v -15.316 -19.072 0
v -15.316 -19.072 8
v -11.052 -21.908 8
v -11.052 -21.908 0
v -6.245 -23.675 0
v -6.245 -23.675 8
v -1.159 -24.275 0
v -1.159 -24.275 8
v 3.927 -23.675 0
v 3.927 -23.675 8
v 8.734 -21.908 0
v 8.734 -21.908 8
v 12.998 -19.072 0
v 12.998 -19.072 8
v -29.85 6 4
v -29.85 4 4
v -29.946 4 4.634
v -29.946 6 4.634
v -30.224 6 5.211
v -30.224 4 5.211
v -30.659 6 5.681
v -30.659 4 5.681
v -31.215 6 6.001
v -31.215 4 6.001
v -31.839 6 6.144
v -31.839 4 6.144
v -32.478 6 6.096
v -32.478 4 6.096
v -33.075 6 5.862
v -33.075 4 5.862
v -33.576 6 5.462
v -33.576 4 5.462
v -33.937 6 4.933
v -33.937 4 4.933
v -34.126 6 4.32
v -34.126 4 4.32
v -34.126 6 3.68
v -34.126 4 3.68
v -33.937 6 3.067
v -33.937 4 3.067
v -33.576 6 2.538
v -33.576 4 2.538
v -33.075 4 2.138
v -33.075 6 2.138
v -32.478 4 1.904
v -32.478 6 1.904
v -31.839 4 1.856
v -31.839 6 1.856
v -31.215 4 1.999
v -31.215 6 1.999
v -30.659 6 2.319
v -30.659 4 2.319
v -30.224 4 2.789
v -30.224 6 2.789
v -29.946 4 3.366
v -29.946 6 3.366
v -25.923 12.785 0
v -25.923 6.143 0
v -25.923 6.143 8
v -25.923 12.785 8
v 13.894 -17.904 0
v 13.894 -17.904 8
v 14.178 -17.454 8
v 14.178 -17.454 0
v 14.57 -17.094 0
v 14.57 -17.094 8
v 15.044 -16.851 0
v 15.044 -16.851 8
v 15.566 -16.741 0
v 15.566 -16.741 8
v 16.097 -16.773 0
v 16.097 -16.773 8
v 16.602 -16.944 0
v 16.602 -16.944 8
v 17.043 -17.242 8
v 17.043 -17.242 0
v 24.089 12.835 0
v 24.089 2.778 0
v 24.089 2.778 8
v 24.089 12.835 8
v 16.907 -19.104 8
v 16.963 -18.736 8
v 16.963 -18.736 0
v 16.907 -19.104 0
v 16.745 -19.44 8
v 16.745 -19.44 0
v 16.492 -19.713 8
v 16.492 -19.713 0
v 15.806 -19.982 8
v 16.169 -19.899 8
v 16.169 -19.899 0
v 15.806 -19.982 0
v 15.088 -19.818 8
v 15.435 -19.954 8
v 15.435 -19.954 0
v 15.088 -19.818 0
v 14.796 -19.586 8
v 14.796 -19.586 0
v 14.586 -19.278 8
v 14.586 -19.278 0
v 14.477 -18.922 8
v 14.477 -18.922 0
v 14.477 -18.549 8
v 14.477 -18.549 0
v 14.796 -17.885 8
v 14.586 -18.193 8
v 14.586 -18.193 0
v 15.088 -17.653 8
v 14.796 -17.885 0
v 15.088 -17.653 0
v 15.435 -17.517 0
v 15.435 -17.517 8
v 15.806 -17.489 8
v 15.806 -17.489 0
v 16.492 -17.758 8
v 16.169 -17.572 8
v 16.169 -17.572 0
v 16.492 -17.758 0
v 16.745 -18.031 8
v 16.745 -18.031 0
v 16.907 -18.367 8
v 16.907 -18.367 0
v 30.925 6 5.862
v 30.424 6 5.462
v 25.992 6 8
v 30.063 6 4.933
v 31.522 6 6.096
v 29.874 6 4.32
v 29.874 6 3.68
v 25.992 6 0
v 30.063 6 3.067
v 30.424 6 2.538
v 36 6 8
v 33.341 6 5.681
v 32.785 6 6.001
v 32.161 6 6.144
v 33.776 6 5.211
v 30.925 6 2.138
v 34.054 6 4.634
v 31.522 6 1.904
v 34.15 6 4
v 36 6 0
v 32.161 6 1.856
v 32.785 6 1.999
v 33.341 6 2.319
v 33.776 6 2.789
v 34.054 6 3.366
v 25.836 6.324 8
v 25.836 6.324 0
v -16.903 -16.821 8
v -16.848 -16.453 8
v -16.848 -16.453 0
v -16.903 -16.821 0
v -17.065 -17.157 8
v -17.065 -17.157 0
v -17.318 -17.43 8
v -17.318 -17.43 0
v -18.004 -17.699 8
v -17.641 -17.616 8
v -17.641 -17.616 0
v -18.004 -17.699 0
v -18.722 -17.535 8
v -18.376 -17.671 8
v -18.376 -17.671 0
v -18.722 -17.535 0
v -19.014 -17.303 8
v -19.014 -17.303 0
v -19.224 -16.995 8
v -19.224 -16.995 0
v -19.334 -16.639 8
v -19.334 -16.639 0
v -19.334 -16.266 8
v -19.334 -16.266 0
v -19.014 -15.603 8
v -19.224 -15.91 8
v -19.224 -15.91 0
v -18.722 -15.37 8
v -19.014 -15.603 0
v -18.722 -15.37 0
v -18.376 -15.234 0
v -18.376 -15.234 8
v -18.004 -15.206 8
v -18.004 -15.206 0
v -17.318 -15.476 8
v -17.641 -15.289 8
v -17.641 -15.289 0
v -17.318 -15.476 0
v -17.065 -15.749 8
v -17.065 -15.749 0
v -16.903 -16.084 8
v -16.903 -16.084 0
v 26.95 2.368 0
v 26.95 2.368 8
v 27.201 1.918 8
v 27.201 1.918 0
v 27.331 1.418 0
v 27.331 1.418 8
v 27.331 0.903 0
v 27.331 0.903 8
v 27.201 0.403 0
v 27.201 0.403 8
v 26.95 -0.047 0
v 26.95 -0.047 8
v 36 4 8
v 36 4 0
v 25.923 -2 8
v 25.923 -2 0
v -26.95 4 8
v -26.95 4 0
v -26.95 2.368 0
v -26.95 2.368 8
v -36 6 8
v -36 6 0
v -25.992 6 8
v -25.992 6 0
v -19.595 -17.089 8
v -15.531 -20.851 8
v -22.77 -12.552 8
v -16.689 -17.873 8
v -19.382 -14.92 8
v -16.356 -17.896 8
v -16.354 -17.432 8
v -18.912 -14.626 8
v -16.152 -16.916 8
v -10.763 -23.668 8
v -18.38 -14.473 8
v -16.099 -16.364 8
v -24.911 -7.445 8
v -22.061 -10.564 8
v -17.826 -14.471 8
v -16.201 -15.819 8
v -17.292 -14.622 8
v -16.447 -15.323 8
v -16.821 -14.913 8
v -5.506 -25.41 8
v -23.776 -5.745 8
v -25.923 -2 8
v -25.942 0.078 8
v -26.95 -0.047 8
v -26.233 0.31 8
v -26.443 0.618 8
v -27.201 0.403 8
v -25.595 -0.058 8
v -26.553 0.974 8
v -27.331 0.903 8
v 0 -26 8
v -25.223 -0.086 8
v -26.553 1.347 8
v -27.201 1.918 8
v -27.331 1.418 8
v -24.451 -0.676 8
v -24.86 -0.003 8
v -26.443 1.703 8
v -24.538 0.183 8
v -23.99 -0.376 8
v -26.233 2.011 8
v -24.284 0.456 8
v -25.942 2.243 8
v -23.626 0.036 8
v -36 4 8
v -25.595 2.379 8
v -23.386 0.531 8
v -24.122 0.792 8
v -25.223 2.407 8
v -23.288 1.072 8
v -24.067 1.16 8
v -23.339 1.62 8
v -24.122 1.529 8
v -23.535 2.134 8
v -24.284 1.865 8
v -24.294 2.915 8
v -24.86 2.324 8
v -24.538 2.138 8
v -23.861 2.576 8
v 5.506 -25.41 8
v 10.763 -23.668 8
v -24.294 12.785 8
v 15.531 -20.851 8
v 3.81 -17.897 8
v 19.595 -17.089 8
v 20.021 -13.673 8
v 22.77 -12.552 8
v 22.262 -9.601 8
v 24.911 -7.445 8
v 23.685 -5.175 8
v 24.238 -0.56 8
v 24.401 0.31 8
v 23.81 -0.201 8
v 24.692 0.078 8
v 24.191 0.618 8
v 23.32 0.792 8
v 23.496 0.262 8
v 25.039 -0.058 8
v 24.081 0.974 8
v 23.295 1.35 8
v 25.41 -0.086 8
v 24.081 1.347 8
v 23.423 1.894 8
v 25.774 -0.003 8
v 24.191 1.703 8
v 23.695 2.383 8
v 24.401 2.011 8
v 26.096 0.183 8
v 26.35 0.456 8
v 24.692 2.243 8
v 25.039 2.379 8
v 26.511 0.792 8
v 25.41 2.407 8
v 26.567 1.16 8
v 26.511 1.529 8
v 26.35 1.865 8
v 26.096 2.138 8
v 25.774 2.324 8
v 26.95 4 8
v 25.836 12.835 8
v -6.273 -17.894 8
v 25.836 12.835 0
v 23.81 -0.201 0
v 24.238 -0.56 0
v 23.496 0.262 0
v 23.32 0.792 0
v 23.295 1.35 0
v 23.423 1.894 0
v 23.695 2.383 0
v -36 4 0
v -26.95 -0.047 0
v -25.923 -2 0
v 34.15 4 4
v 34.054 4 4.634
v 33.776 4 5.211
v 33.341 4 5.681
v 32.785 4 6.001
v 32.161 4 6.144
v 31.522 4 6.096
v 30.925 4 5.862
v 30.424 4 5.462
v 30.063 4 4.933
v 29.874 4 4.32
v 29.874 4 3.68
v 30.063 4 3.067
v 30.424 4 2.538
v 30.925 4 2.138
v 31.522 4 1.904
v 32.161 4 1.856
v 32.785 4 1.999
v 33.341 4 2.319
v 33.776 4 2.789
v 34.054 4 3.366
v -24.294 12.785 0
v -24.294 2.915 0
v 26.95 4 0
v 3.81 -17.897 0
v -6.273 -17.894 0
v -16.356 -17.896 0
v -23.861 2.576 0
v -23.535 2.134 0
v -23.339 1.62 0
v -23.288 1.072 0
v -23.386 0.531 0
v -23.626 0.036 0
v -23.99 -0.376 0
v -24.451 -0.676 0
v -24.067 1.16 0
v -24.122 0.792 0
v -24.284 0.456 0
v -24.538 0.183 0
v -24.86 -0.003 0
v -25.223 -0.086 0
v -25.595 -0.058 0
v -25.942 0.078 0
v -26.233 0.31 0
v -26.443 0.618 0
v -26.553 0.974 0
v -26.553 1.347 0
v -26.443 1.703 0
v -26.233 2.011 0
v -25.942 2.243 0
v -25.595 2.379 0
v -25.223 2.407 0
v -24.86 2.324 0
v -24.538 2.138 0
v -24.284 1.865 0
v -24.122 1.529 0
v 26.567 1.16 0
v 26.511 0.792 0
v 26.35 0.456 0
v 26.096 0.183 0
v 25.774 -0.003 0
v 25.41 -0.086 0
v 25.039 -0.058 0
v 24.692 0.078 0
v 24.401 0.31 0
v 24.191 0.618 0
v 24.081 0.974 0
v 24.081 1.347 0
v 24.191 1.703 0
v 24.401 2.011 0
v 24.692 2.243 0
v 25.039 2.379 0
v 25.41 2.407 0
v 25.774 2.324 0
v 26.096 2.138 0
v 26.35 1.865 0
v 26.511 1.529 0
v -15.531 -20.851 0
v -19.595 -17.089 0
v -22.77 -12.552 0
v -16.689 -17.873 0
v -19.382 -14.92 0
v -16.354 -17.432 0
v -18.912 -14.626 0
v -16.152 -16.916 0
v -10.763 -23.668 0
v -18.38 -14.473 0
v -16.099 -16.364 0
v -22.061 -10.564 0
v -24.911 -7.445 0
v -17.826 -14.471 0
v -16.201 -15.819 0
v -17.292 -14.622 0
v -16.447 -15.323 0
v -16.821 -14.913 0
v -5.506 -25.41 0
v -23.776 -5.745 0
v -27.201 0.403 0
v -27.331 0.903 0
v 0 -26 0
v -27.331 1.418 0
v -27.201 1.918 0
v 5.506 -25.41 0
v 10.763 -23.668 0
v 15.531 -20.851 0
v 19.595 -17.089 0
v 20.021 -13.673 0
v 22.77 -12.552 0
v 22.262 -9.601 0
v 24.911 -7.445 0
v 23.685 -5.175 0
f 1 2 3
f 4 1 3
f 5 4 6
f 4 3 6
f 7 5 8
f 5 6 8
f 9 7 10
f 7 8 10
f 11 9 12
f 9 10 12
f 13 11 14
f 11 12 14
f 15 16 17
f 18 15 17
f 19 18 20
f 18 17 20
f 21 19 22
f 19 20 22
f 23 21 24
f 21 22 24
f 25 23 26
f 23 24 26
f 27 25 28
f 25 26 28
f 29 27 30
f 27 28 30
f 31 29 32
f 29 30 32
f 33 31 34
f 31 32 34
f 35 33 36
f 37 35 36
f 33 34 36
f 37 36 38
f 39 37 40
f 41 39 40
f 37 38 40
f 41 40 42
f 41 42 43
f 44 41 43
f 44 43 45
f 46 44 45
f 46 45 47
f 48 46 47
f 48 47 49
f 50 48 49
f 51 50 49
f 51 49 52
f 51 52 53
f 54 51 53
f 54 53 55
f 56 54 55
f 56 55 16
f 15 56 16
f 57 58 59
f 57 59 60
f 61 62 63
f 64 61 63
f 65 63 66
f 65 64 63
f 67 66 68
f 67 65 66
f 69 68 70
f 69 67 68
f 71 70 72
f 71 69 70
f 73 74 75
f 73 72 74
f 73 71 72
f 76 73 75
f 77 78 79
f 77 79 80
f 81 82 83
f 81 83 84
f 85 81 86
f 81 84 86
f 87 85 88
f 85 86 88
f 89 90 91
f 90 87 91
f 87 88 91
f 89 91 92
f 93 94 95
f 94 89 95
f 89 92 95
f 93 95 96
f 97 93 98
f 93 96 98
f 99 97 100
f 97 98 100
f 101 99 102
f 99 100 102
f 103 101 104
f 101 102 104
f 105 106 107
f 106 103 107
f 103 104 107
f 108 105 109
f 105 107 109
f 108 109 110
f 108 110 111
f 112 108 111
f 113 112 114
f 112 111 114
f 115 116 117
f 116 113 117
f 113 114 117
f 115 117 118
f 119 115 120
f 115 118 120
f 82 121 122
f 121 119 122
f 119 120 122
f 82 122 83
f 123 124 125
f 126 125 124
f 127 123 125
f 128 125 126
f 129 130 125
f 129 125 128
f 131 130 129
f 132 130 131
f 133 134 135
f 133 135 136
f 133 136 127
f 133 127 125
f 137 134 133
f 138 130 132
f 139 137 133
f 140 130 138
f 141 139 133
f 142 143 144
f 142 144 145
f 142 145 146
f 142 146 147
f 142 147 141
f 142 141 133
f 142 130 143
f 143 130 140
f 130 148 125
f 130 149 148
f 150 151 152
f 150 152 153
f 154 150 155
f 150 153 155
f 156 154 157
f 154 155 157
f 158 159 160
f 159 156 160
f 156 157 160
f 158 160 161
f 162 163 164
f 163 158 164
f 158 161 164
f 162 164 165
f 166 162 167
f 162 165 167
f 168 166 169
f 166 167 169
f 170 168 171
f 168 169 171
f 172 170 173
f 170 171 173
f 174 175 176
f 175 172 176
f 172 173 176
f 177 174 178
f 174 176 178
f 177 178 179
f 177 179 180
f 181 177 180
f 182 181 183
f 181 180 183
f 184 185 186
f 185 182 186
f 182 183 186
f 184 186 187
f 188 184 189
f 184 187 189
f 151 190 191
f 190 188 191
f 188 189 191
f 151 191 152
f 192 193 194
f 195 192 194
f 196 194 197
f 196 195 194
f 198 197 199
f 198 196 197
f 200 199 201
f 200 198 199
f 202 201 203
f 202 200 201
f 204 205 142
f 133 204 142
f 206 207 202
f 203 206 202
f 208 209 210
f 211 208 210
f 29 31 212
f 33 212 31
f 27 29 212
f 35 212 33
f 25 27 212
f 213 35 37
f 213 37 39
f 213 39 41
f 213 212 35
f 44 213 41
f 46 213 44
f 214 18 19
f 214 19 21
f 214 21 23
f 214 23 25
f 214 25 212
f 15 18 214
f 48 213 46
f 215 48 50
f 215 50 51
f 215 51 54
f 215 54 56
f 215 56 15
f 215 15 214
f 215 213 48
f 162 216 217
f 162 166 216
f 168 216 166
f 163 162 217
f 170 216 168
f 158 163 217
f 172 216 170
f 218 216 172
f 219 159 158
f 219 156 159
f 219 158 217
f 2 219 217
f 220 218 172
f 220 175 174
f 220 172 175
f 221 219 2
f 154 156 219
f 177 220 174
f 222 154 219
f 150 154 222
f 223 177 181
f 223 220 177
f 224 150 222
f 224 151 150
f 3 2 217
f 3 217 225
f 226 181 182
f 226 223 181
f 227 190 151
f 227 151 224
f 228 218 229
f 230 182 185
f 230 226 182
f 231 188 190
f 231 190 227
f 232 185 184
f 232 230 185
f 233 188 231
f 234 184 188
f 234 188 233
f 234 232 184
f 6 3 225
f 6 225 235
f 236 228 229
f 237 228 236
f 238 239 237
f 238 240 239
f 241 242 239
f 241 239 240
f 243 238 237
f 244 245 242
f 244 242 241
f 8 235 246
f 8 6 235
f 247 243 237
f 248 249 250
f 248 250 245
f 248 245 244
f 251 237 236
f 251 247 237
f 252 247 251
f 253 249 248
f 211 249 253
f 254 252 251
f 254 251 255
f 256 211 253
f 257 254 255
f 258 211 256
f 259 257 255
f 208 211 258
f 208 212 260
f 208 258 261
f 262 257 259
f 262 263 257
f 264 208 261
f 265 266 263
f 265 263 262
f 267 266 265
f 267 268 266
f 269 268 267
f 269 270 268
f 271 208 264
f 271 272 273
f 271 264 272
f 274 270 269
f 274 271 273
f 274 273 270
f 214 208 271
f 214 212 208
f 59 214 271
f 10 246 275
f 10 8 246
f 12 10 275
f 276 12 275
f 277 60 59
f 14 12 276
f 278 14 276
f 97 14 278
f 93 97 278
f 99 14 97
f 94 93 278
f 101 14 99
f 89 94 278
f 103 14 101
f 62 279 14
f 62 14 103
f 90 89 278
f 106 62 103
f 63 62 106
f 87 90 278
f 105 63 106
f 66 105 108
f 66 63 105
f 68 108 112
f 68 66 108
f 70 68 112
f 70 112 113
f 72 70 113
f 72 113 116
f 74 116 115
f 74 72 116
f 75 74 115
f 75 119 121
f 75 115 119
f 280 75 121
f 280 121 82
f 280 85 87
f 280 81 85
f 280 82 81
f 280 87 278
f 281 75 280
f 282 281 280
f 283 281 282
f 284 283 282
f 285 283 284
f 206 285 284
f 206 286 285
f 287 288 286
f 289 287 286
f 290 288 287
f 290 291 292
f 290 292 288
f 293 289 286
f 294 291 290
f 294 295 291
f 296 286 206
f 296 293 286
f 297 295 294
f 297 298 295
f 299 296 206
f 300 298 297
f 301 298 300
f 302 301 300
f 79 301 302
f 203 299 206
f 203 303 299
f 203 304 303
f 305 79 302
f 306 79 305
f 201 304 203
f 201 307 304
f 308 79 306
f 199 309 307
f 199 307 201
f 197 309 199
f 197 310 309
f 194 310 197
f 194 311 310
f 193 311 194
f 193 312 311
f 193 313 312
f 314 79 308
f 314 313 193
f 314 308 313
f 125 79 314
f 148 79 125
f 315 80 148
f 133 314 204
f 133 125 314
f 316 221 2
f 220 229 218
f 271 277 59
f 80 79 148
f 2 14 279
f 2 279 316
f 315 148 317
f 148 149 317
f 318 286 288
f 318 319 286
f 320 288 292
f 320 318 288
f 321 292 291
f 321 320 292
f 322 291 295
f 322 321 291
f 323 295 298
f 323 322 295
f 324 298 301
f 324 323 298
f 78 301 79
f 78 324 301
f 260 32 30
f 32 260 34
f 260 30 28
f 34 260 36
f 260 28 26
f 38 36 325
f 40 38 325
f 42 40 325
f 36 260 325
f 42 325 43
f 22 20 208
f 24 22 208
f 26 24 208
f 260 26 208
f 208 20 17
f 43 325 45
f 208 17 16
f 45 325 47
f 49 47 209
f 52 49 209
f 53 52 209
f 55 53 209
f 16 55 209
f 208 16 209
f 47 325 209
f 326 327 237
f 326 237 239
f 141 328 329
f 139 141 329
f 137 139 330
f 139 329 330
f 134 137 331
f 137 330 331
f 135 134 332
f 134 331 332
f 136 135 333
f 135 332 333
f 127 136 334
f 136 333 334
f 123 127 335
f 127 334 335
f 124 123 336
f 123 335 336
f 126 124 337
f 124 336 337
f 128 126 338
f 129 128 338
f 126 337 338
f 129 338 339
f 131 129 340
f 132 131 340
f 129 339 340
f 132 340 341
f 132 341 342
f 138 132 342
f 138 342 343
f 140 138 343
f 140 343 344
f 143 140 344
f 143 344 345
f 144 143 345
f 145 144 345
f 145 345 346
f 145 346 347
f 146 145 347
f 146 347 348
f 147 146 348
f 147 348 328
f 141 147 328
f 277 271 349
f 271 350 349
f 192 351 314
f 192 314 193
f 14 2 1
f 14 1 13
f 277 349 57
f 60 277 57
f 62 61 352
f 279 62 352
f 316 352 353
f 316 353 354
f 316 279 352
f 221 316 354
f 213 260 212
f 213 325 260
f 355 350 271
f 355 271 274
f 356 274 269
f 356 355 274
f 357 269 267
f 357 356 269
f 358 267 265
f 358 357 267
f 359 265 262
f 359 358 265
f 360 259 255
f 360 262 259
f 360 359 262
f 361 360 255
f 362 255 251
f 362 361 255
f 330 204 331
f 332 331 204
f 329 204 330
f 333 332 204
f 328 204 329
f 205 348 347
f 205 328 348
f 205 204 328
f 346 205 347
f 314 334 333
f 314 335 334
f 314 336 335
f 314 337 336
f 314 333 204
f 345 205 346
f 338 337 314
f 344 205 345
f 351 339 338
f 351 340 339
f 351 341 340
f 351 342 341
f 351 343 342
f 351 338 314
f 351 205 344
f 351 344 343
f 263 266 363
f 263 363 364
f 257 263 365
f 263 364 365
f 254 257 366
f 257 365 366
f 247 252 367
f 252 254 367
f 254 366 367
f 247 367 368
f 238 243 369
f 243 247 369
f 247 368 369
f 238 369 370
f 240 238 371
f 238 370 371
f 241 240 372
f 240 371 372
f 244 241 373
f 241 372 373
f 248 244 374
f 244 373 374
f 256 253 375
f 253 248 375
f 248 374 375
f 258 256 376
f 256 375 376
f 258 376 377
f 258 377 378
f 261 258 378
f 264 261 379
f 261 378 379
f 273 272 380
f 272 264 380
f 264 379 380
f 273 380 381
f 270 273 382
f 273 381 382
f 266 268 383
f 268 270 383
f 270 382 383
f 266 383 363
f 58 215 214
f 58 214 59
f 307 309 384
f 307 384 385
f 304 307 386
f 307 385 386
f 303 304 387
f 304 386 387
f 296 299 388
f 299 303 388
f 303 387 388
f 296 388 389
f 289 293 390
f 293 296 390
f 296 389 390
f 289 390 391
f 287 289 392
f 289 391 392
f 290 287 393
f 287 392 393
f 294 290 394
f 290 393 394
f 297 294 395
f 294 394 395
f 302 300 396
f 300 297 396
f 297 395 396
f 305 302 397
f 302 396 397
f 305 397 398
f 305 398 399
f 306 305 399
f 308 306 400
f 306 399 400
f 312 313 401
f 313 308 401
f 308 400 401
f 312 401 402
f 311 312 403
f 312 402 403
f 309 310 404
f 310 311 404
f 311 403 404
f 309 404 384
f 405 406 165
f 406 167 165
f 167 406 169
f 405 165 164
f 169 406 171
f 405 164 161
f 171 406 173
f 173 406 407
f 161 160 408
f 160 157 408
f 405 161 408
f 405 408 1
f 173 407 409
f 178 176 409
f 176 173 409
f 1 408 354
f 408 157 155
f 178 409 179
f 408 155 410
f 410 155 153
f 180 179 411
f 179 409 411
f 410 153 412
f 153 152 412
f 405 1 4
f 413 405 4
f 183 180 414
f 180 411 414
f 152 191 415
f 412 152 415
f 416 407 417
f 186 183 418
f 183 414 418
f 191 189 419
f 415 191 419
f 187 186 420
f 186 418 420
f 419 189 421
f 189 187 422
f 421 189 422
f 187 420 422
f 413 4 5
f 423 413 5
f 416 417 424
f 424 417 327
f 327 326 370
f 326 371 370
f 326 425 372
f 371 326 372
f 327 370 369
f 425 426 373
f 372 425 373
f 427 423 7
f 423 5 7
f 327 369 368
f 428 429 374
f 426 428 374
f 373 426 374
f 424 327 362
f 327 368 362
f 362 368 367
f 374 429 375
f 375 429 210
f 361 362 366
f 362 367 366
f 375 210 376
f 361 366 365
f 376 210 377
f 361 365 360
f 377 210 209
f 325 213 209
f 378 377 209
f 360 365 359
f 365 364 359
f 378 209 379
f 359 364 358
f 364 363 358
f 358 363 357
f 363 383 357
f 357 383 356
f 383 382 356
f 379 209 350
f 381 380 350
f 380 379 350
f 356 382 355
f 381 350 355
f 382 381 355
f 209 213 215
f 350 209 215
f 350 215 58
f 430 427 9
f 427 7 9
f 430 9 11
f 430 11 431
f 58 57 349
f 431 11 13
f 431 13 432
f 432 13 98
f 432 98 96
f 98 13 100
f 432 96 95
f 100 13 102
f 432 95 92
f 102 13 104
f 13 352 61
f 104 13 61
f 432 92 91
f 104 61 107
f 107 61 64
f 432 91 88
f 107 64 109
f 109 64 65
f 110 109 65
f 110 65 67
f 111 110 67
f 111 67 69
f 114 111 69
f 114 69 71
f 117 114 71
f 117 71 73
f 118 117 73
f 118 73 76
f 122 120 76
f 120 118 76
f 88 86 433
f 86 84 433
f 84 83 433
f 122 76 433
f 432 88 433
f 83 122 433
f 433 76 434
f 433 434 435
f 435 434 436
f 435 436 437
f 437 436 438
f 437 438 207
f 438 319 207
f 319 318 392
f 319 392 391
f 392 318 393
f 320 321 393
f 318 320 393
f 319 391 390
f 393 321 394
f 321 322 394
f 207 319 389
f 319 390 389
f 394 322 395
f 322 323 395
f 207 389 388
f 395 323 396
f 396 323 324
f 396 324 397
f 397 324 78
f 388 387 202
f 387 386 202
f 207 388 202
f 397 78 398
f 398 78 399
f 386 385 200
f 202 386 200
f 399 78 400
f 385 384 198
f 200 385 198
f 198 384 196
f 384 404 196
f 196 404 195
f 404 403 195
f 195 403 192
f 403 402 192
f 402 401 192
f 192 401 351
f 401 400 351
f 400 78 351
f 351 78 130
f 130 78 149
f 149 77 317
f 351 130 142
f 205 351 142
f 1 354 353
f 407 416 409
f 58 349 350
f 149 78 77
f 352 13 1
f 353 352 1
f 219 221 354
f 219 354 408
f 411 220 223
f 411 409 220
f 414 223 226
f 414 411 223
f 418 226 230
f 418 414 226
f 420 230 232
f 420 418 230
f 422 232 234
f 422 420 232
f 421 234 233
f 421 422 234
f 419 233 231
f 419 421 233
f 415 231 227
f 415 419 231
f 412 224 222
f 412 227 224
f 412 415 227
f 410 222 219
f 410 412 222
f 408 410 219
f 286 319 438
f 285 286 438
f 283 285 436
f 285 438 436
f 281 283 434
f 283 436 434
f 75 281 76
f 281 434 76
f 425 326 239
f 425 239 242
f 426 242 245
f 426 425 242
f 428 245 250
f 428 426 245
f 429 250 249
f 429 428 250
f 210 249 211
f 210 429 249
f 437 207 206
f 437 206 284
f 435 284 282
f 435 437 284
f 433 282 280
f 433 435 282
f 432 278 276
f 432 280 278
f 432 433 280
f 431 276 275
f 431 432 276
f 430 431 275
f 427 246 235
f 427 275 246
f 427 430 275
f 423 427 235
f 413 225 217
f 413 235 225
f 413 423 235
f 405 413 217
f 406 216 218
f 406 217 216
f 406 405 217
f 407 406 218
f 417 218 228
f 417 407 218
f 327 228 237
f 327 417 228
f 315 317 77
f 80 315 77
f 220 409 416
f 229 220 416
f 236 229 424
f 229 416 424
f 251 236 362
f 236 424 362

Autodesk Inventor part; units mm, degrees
ref_plane "YZ Plane" through (0, 0, 0) normal (1, 0, 0) x (0, 1, 0)
ref_plane "XZ Plane" through (0, 0, 0) normal (0, 1, 0) x (-1, 0, 0)
ref_plane "XY Plane" through (0, 0, 0) normal (0, 0, 1) x (1, 0, 0)
sketch "Esquisse1" plane through (0, 0, 0) normal (0, 0, 1) x (1, 0, 0)
  line L0 (0, 0) -> (-27.546, -25.0426) construction
  line L1 (0, 0) -> (23.0277, -27.4577) construction
  circle A0 centre (-18.0975, -16.4528) radius 1.25
  circle A1 centre (15.7127, -18.7355) radius 1.25
  arc A2 (-16.6894, -17.8731) -> (14.1299, -19.9581) centre (0, 0) ccw
  arc A3 (-16.6894, -17.8731) -> (-19.3824, -14.9201) centre (-18.0975, -16.4528) ccw
  arc A4 (17.0433, -17.2424) -> (14.1299, -19.9581) centre (15.7127, -18.7355) ccw
  line L2 (0, 0) -> (-29.5508, 10.7556) construction
  line L3 (-17.8311, 0) -> (17.1748, 0) construction
  line L4 (0, 2.0526) -> (0, -2.2236) construction
  arc A5 (-25.923, -2) -> (25.923, -2) centre (0, 0) ccw
  circle A6 centre (0, 0) radius 22.5 construction
  arc A7 (-16.6894, -17.8731) -> (14.1299, -19.9581) centre (0, 0) ccw
  arc A8 (-16.6894, -17.8731) -> (14.1299, -19.9581) centre (0, 0) ccw
  circle A9 centre (-25.3169, 1.1605) radius 1.25
  circle A10 centre (25.3169, 1.1605) radius 1.25
  line L5 (24.0891, 2.7784) -> (24.0891, 12.8348)
  line L6 (25.8363, 12.8348) -> (24.0891, 12.8348)
  line L7 (-25.923, 6.143) -> (-25.923, 12.7847)
  line L8 (-24.2942, 2.9148) -> (-24.2942, 12.7847)
  line L9 (-24.2942, 12.7847) -> (-25.923, 12.7847)
  arc A11 (-24.4506, -0.676) -> (-19.3824, -14.9201) centre (0, 0) ccw
  arc A12 (-24.4506, -0.676) -> (-19.3824, -14.9201) centre (0, 0) ccw
  arc A13 (-24.4506, -0.676) -> (-24.2942, 2.9148) centre (-25.3169, 1.1605) ccw
  arc A14 (17.0433, -17.2424) -> (24.2376, -0.5599) centre (0, 0) ccw
  arc A15 (17.0433, -17.2424) -> (24.2376, -0.5599) centre (0, 0) ccw
  arc A16 (17.0433, -17.2424) -> (24.2376, -0.5599) centre (0, 0) ccw
  arc A17 (24.0891, 2.7784) -> (24.2376, -0.5599) centre (25.3169, 1.1605) ccw
  line L10 (25.8363, 3.0919) -> (25.8363, 3.124)
  line L11 (25.8363, 6.3239) -> (25.8363, 12.8348)
  line L12 (25.8363, 6.3239) -> (25.9915, 6)
  line L13 (-36, 4) -> (-26.9495, 4)
  line L14 (-36, 6) -> (-26, 6)
  line L15 (-36, 4) -> (-36, 6)
  line L16 (-26, 6) -> (-25.9915, 6)
  line L17 (-25.9915, 6) -> (-25.923, 6.143)
  line L18 (-26.9495, 4) -> (-26.9495, 2.3678)
  line L19 (-25.923, -2) -> (-26.9495, -0.0468)
  arc A18 (-26.9495, 2.3678) -> (-26.9495, -0.0468) centre (-25.3169, 1.1605) ccw
  arc A19 (-24.4506, -0.676) -> (-24.2942, 2.9148) centre (-25.3169, 1.1605) ccw
  line L20 (25.9915, 6) -> (25.923, 6.143)
  line L21 (36, 4) -> (26.9495, 4)
  line L22 (36, 6) -> (26, 6)
  line L23 (36, 4) -> (36, 6)
  line L24 (26.9495, 4) -> (26.9495, 2.3678)
  line L25 (25.923, -2) -> (26.9495, -0.0468)
  arc A20 (26.9495, -0.0468) -> (26.9495, 2.3678) centre (25.3169, 1.1605) ccw
  line L26 (25.9915, 6) -> (26, 6)
  point P0 (29.8237, -2)
  point P1 (-36, -2)
  point P2 (-26.3114, 9.5766)
  dimension "d35" = 2.5
  dimension "d36" = 2.5
  dimension "d37" = 4
  dimension "d38" = 4
  dimension "d39" = 20
  dimension "d52" = 45
  dimension "d65" = 2.5
  dimension "d81" = 10
ref_plane "Plan de construction1" through (-42, 0, 0) normal (0, 1, 0) x (1, 0, 0)
ref_plane "Plan de construction2" through (-36, 0, 0) normal (0, 1, 0) x (1, 0, 0)
sketch "Esquisse3" plane through (-36, 0, 0) normal (0, 1, 0) x (1, 0, 0)
  line L0 (0, 0) -> (10, 0) projected
  line L1 (0, 0) -> (0, -8) projected
  line L2 (10, -8) -> (0, -8) projected
  line L3 (10, 0) -> (10, -8) projected
  circle A0 centre (4, -4) radius 2.15
  line L4 (62, 0) -> (72, 0) projected
  line L5 (62, 0) -> (62, -8) projected
  line L6 (72, -8) -> (62, -8) projected
  line L7 (72, 0) -> (72, -8) projected
  circle A1 centre (68, -4) radius 2.15
  point P0 (36, 0)
  dimension "d48" = 4.3
  dimension "d73" = 4
  dimension "d74" = 4.3
  dimension "d75" = 4
extrude "Extrusion16" add sketch "Esquisse1" along normal blind 8
extrude "Extrusion17" cut sketch "Esquisse3" along normal blind 8 contours A0 | A1
sketch "Esquisse5" plane through (0, 0, 8) normal (0, 0, 1) x (1, 0, 0)
  arc A0 (-16.6894, -17.8731) -> (14.1299, -19.9581) centre (0, 0) ccw projected
  circle A1 centre (25.3169, 1.1605) radius 1.25 projected
  circle A2 centre (-25.3169, 1.1605) radius 1.25 projected
  circle A3 centre (15.7127, -18.7355) radius 1.25 projected
  circle A4 centre (-18.0975, -16.4528) radius 1.25 projected
  arc A5 (-16.6894, -17.8731) -> (-19.3824, -14.9201) centre (-18.0975, -16.4528) ccw projected
  arc A6 (-24.4506, -0.676) -> (-19.3824, -14.9201) centre (0, 0) ccw projected
  arc A7 (-24.4506, -0.676) -> (-24.2942, 2.9148) centre (-25.3169, 1.1605) ccw projected
  line L0 (-24.2942, 2.9148) -> (-24.2942, 12.7847) projected
  line L1 (-24.2942, 12.7847) -> (-25.923, 12.7847) projected
  line L2 (-25.923, 12.7847) -> (-25.923, 6.143) projected
  line L3 (-25.923, 6.143) -> (-25.9915, 6) projected
  line L4 (-25.9915, 6) -> (-36, 6) projected
  line L5 (-36, 6) -> (-36, 4) projected
  line L6 (-36, 4) -> (-26.9495, 4) projected
  line L7 (-26.9495, 4) -> (-26.9495, 2.3678) projected
  arc A8 (-26.9495, 2.3678) -> (-26.9495, -0.0468) centre (-25.3169, 1.1605) ccw projected
  line L8 (-26.9495, -0.0468) -> (-25.923, -2) projected
  arc A9 (-25.923, -2) -> (25.923, -2) centre (0, 0) ccw projected
  line L9 (25.923, -2) -> (26.9495, -0.0468) projected
  arc A10 (26.9495, -0.0468) -> (26.9495, 2.3678) centre (25.3169, 1.1605) ccw projected
  line L10 (26.9495, 2.3678) -> (26.9495, 4) projected
  line L11 (26.9495, 4) -> (36, 4) projected
  line L12 (36, 4) -> (36, 6) projected
  line L13 (36, 6) -> (25.9915, 6) projected
  line L14 (25.9915, 6) -> (25.8363, 6.3239) projected
  line L15 (25.8363, 6.3239) -> (25.8363, 12.8348) projected
  line L16 (25.8363, 12.8348) -> (24.0891, 12.8348) projected
  line L17 (24.0891, 12.8348) -> (24.0891, 2.7784) projected
  arc A11 (24.0891, 2.7784) -> (24.2376, -0.5599) centre (25.3169, 1.1605) ccw projected
  arc A12 (17.0433, -17.2424) -> (24.2376, -0.5599) centre (0, 0) ccw projected
  arc A13 (17.0433, -17.2424) -> (14.1299, -19.9581) centre (15.7127, -18.7355) ccw projected
  arc A14 (-16.6894, -17.8731) -> (14.1299, -19.9581) centre (0, 0) ccw projected
  line L18 (-16.356, -17.8956) -> (-16.6894, -17.8731)
  arc A15 (17.0433, -17.2424) -> (14.1299, -19.9581) centre (15.7127, -18.7355) ccw projected
  arc A16 (13.8936, -17.9043) -> (-16.356, -17.8956) centre (-8.178, -24366.3326) ccw
  arc A17 (-16.6894, -17.8731) -> (-19.3824, -14.9201) centre (-18.0975, -16.4528) ccw projected
  arc A18 (-16.6894, -17.8731) -> (14.1299, -19.9581) centre (0, 0) ccw
  arc A19 (13.8936, -17.9043) -> (14.1299, -19.9581) centre (15.7127, -18.7355) ccw
extrude "Extrusion18" add sketch "Esquisse5" against normal blind 8 contours L18 A16 A13 A0
sketch "Esquisse6" plane through (0, 0, 8) normal (0, 0, 1) x (1, 0, 0)
  circle A0 centre (25.3169, 1.1605) radius 1.25 projected
  circle A1 centre (-25.3169, 1.1605) radius 1.25 projected
  circle A2 centre (15.7127, -18.7355) radius 1.25 projected
  circle A3 centre (-18.0975, -16.4528) radius 1.25 projected
  arc A4 (-16.6894, -17.8731) -> (-19.3824, -14.9201) centre (-18.0975, -16.4528) ccw projected
  arc A5 (-24.4506, -0.676) -> (-19.3824, -14.9201) centre (0, 0) ccw projected
  arc A6 (-24.4506, -0.676) -> (-24.2942, 2.9148) centre (-25.3169, 1.1605) ccw projected
  line L0 (-24.2942, 2.9148) -> (-24.2942, 12.7847) projected
  line L1 (-24.2942, 12.7847) -> (-25.923, 12.7847) projected
  line L2 (-25.923, 12.7847) -> (-25.923, 6.143) projected
  line L3 (-25.923, 6.143) -> (-25.9915, 6) projected
  line L4 (-25.9915, 6) -> (-36, 6) projected
  line L5 (-36, 6) -> (-36, 4) projected
  line L6 (-36, 4) -> (-26.9495, 4) projected
  line L7 (-26.9495, 4) -> (-26.9495, 2.3678) projected
  arc A7 (-26.9495, 2.3678) -> (-26.9495, -0.0468) centre (-25.3169, 1.1605) ccw projected
  line L8 (-26.9495, -0.0468) -> (-25.923, -2) projected
  arc A8 (-25.923, -2) -> (25.923, -2) centre (0, 0) ccw projected
  line L9 (25.923, -2) -> (26.9495, -0.0468) projected
  arc A9 (26.9495, -0.0468) -> (26.9495, 2.3678) centre (25.3169, 1.1605) ccw projected
  line L10 (26.9495, 2.3678) -> (26.9495, 4) projected
  line L11 (26.9495, 4) -> (36, 4) projected
  line L12 (36, 4) -> (36, 6) projected
  line L13 (36, 6) -> (25.9915, 6) projected
  line L14 (25.9915, 6) -> (25.8363, 6.3239) projected
  line L15 (25.8363, 6.3239) -> (25.8363, 12.8348) projected
  line L16 (25.8363, 12.8348) -> (24.0891, 12.8348) projected
  line L17 (24.0891, 12.8348) -> (24.0891, 2.7784) projected
  arc A10 (24.0891, 2.7784) -> (24.2376, -0.5599) centre (25.3169, 1.1605) ccw projected
  arc A11 (17.0433, -17.2424) -> (24.2376, -0.5599) centre (0, 0) ccw projected
  arc A12 (17.0433, -17.2424) -> (13.8936, -17.9043) centre (15.7127, -18.7355) ccw projected
  arc A13 (13.8936, -17.9043) -> (-16.356, -17.8956) centre (-8.178, -24366.3326) ccw projected
  line L18 (-16.356, -17.8956) -> (-16.6894, -17.8731) projected
  line L19 (-15.3155, -19.0715) -> (12.9977, -19.0715)
  arc A14 (-15.3155, -19.0715) -> (12.9977, -19.0715) centre (-1.1589, -2.415) ccw
extrude "Extrusion19" cut sketch "Esquisse6" against normal blind 8 contours L19 A14
properties part number "anneaustop"
